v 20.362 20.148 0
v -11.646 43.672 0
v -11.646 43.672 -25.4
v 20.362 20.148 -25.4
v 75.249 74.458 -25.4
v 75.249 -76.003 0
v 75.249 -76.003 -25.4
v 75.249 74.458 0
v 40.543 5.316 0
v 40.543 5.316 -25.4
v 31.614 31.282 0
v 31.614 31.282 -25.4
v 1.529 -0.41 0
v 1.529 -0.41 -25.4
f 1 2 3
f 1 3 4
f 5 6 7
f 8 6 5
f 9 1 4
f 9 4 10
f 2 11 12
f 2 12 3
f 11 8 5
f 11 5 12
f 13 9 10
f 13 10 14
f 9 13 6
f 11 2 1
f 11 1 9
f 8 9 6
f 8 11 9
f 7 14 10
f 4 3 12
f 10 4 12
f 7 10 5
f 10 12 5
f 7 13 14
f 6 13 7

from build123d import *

# Parameters (mm, degrees)
F1_DEPTH = 25.4


with BuildPart() as f1:
    # F0 (on Top) → F1 (new body)
    with BuildSketch(Plane.XY):
        Polygon((-11.6460118443, 43.6722375453), (20.3620182707, 20.1480132985), (31.6143950059, 31.2821274658), align=None)
        Polygon((75.2486810088, 74.4578167796), (31.6143950059, 31.2821274658), (54.9272783101, 24.60514009), (40.5425727367, 5.3163636476), (1.5286983689, -0.4096143239), (75.2486810088, -76.0029926896), align=None)
        Polygon((31.6143950059, 31.2821274658), (20.3620182707, 20.1480132985), (40.5425727367, 5.3163636476), (54.9272783101, 24.60514009), align=None)
    extrude(amount=-F1_DEPTH)


solid = f1.part
